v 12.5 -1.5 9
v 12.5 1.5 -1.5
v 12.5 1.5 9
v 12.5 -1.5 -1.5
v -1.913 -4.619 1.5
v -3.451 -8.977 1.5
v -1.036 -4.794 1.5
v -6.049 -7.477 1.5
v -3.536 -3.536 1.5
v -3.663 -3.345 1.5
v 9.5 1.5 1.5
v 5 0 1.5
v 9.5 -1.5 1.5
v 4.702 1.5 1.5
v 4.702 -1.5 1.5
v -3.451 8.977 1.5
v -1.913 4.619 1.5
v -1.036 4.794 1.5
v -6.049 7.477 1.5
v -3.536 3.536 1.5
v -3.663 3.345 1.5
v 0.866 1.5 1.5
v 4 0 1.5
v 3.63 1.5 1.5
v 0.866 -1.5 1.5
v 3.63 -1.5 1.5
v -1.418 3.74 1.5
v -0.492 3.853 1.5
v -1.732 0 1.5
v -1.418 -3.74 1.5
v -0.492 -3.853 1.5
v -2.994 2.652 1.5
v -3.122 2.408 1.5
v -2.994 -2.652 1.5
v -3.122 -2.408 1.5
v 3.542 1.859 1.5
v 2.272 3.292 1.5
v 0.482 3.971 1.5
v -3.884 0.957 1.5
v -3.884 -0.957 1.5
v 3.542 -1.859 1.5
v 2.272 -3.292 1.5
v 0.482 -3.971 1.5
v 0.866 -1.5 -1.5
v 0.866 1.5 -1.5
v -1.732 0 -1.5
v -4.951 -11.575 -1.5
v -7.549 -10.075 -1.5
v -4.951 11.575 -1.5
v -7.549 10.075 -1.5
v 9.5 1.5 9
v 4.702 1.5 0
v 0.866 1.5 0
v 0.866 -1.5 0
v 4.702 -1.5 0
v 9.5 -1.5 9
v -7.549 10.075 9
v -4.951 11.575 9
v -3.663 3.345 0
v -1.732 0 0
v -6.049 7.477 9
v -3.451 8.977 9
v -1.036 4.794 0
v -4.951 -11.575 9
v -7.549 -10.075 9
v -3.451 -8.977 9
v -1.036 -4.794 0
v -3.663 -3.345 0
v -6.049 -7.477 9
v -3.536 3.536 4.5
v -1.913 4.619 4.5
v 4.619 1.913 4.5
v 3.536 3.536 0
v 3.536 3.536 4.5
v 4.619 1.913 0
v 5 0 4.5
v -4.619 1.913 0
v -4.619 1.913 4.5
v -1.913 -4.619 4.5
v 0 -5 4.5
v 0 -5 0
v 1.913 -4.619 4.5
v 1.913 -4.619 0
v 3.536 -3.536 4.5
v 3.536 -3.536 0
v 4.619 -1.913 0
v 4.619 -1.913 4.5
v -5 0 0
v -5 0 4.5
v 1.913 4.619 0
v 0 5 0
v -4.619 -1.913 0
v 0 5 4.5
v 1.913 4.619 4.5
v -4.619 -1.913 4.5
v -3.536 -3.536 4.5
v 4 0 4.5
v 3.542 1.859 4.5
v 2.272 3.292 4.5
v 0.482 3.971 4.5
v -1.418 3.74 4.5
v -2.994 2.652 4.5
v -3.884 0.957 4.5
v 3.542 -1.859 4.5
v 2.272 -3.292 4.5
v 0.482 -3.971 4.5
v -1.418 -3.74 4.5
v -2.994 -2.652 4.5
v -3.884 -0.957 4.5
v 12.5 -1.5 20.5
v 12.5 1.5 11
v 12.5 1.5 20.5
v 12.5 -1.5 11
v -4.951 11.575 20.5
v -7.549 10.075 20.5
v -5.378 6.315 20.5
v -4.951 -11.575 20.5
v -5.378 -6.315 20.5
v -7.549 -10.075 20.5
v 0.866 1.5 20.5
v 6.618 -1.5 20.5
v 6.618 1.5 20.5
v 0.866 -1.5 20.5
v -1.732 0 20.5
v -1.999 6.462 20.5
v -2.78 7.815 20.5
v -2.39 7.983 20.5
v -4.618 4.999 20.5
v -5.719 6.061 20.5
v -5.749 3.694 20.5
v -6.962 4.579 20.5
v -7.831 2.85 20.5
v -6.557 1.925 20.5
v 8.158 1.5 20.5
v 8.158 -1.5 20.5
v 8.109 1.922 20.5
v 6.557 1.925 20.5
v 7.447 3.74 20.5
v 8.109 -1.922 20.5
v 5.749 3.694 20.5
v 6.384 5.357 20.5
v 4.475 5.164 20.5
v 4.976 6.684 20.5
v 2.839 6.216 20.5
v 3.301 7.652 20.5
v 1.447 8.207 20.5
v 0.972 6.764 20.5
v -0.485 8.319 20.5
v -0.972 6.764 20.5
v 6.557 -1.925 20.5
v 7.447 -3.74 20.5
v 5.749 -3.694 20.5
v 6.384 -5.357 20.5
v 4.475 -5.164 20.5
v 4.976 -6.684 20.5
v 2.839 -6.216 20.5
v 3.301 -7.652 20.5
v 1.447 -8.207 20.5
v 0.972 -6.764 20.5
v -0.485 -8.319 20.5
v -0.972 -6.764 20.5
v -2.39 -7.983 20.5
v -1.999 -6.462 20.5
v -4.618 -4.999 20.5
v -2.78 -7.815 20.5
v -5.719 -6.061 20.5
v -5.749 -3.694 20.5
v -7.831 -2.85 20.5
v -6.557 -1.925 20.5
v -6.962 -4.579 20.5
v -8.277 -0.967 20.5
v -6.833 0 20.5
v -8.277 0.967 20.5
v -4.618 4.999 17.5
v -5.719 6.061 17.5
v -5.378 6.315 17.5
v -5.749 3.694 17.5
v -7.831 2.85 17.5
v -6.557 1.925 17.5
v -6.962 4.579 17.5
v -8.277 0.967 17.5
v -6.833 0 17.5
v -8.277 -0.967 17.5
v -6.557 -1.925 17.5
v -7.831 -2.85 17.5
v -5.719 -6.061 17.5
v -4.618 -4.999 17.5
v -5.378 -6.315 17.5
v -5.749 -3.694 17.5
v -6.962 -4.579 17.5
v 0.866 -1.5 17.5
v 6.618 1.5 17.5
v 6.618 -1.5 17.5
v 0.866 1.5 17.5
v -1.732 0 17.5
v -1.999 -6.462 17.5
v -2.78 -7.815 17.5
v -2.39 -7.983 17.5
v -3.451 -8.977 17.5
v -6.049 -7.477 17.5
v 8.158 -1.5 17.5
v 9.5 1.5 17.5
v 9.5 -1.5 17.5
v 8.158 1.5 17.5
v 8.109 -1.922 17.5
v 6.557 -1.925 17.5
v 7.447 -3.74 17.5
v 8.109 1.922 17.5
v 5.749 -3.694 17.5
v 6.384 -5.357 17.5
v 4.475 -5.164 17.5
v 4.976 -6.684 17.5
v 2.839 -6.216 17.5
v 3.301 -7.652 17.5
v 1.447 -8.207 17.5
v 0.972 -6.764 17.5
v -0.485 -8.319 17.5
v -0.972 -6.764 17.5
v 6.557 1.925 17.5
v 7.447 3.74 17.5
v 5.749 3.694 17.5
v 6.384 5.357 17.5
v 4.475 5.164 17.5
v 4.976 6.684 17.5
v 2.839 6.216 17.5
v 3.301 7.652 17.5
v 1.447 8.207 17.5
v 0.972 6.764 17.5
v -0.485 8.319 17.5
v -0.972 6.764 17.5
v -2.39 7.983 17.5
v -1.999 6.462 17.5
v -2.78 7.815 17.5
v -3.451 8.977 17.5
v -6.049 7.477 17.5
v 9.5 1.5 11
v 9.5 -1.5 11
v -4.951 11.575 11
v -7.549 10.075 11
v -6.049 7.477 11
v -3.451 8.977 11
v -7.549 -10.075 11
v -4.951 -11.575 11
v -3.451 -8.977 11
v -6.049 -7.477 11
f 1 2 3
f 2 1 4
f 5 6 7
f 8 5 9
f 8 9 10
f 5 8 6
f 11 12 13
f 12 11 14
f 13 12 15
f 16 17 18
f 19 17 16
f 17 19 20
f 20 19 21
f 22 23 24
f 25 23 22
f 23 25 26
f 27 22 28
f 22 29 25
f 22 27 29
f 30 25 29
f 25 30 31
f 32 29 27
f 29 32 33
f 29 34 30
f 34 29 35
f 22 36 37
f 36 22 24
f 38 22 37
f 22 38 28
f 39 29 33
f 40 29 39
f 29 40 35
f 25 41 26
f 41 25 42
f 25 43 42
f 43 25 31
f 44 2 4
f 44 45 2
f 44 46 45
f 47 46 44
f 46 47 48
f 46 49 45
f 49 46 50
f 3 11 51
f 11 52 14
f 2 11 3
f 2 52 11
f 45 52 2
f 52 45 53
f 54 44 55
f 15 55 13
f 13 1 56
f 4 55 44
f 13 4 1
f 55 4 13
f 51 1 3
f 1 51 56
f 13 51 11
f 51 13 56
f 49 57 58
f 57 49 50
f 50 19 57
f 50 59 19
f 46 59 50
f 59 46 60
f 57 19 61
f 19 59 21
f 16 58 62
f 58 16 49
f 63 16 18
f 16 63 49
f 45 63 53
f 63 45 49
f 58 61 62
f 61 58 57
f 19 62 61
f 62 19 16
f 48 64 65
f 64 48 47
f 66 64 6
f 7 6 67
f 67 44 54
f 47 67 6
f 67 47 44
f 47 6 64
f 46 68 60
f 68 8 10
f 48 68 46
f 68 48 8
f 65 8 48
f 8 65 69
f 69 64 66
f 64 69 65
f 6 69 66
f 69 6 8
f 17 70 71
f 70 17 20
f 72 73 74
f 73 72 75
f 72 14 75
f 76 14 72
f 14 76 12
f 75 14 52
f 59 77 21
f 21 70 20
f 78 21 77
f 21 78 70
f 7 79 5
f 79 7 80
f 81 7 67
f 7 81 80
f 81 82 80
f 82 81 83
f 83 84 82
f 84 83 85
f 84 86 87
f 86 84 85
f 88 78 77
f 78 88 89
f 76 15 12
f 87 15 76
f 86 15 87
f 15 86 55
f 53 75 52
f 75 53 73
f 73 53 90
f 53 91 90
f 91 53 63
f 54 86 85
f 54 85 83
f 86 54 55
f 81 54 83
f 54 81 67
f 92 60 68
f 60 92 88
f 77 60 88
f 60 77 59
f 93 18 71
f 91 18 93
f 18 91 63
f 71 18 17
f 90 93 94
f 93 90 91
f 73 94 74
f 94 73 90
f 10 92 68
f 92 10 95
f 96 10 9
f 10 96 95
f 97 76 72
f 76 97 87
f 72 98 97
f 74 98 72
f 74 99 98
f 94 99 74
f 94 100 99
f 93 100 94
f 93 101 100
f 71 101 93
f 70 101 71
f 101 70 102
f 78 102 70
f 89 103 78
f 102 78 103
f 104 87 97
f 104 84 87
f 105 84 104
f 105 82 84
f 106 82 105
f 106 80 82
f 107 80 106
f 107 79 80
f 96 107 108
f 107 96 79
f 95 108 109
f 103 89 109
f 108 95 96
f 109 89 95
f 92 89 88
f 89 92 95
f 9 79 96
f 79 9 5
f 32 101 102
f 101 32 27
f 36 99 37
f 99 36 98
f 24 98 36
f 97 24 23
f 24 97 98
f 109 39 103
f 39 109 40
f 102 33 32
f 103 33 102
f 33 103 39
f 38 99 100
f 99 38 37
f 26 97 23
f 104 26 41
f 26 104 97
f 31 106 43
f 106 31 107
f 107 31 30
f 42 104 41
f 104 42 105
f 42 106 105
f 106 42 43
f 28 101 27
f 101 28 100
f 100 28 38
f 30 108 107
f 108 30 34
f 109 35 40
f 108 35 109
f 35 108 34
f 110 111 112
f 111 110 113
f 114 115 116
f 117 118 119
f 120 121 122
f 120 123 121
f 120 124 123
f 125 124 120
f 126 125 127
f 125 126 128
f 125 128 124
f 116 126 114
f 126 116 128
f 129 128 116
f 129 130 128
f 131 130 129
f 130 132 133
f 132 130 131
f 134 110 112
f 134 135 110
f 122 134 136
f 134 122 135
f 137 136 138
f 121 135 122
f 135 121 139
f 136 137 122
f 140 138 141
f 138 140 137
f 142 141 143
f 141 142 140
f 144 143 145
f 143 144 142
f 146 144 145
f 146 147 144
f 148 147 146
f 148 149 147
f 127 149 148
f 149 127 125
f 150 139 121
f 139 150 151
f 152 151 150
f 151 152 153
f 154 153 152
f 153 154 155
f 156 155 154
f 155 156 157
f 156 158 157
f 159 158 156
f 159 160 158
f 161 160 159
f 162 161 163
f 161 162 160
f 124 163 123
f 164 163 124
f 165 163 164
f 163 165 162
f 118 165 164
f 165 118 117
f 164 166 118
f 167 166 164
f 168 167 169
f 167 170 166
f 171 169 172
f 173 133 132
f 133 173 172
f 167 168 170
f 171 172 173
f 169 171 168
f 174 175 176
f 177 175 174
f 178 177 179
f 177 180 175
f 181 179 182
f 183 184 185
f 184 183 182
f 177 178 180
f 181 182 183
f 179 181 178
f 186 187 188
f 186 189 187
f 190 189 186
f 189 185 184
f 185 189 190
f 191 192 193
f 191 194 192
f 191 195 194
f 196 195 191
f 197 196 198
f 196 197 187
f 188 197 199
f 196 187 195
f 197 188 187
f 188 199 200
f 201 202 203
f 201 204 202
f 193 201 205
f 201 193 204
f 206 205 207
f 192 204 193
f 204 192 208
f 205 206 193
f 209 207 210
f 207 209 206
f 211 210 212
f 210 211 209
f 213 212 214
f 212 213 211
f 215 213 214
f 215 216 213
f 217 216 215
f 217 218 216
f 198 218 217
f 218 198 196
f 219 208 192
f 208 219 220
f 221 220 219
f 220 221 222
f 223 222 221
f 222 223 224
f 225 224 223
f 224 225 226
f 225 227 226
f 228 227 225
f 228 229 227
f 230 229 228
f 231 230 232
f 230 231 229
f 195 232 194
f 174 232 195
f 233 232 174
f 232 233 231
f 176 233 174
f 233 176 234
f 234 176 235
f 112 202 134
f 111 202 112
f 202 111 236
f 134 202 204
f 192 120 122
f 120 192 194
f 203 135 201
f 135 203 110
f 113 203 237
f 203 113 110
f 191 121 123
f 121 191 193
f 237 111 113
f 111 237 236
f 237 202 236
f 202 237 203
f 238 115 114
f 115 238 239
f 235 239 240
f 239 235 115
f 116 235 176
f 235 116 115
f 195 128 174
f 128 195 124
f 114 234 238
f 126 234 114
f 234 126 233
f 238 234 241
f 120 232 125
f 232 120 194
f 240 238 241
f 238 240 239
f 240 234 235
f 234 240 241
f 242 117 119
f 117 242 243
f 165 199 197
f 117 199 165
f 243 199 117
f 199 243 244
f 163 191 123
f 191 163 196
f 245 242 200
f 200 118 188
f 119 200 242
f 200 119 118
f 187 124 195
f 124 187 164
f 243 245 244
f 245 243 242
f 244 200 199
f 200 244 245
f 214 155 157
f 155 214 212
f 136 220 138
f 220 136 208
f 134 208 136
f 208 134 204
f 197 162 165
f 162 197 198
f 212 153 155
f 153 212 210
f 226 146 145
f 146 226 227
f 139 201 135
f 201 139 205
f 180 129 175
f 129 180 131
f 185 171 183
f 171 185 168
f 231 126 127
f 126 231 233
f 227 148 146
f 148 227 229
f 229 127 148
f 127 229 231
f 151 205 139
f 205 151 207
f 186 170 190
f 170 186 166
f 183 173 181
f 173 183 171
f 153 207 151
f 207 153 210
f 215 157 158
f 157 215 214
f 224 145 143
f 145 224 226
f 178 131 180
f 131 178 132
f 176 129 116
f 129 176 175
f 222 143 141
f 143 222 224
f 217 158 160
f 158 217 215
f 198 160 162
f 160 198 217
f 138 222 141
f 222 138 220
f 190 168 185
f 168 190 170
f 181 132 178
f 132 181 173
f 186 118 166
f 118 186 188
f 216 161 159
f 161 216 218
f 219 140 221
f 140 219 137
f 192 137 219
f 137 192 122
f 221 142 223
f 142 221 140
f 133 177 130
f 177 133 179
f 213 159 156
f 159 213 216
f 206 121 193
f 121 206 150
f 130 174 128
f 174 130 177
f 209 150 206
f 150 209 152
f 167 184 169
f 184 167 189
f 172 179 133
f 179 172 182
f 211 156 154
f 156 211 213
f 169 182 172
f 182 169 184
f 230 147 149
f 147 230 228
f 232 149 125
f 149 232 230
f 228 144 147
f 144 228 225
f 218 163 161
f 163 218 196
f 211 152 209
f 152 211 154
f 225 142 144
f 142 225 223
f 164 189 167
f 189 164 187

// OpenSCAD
h = 25; //radius of pipe
t=3; //thickness of build plastic
mg = 9; // magnet gap
fg= 8;  //floating gap
alt= 3; //aluminium thickness
alr= (h+2)/2;  //Al outer radius
ali = 10/2 ;  //Al inner radius

module temp(){
cylinder(r=h,h= 5);
cylinder(r=1,h=100);
translate([h+2,0,0])cylinder(r=h,10);
translate([-h-2,0,0])cylinder(r=h/2,10);
}

module magnet_holder(){
for(i= [0,120,240])
rotate([0,0,i])
    union(){
    translate([h/4,0,0,])cube([h/2,t,t], center = true);
    translate([h/2-t/2,0,mg/2])cube([t,t,mg],center=true);
    }
difference(){
cylinder(r=8/2+1,h=3+t/2);
translate([0,0,t/2])cylinder(r=8/2,h=3+t/2);
}
};

module ring() {
    difference(){
        union(){
        cylinder(r=h/2,h=t+alt);
        cylinder(r=h/2+0.5,h= 1);
        }
        cylinder(r=ali,h=20,center=true);
        translate([0,0,h/2])cylinder(r=alr,h=20,center=true);
    }
};

module float_limit(){
for(i= [0,120,240])
rotate([0,0,i])
    union(){
    translate([h/4,0,0,])cube([h/2,t,t], center = true);
    translate([h/2-t/2,0,-fg/2])cube([t,t,fg],center=true);
   
     };
    
     difference(){
        cylinder(r=h/3,h=t,center=true);
        cylinder(r=h/3-t/2,h=20,center=true);
    }

};

magnet_holder();
%translate([0,0,mg])ring();
translate([0,0,mg+fg+alt-1]) float_limit();
